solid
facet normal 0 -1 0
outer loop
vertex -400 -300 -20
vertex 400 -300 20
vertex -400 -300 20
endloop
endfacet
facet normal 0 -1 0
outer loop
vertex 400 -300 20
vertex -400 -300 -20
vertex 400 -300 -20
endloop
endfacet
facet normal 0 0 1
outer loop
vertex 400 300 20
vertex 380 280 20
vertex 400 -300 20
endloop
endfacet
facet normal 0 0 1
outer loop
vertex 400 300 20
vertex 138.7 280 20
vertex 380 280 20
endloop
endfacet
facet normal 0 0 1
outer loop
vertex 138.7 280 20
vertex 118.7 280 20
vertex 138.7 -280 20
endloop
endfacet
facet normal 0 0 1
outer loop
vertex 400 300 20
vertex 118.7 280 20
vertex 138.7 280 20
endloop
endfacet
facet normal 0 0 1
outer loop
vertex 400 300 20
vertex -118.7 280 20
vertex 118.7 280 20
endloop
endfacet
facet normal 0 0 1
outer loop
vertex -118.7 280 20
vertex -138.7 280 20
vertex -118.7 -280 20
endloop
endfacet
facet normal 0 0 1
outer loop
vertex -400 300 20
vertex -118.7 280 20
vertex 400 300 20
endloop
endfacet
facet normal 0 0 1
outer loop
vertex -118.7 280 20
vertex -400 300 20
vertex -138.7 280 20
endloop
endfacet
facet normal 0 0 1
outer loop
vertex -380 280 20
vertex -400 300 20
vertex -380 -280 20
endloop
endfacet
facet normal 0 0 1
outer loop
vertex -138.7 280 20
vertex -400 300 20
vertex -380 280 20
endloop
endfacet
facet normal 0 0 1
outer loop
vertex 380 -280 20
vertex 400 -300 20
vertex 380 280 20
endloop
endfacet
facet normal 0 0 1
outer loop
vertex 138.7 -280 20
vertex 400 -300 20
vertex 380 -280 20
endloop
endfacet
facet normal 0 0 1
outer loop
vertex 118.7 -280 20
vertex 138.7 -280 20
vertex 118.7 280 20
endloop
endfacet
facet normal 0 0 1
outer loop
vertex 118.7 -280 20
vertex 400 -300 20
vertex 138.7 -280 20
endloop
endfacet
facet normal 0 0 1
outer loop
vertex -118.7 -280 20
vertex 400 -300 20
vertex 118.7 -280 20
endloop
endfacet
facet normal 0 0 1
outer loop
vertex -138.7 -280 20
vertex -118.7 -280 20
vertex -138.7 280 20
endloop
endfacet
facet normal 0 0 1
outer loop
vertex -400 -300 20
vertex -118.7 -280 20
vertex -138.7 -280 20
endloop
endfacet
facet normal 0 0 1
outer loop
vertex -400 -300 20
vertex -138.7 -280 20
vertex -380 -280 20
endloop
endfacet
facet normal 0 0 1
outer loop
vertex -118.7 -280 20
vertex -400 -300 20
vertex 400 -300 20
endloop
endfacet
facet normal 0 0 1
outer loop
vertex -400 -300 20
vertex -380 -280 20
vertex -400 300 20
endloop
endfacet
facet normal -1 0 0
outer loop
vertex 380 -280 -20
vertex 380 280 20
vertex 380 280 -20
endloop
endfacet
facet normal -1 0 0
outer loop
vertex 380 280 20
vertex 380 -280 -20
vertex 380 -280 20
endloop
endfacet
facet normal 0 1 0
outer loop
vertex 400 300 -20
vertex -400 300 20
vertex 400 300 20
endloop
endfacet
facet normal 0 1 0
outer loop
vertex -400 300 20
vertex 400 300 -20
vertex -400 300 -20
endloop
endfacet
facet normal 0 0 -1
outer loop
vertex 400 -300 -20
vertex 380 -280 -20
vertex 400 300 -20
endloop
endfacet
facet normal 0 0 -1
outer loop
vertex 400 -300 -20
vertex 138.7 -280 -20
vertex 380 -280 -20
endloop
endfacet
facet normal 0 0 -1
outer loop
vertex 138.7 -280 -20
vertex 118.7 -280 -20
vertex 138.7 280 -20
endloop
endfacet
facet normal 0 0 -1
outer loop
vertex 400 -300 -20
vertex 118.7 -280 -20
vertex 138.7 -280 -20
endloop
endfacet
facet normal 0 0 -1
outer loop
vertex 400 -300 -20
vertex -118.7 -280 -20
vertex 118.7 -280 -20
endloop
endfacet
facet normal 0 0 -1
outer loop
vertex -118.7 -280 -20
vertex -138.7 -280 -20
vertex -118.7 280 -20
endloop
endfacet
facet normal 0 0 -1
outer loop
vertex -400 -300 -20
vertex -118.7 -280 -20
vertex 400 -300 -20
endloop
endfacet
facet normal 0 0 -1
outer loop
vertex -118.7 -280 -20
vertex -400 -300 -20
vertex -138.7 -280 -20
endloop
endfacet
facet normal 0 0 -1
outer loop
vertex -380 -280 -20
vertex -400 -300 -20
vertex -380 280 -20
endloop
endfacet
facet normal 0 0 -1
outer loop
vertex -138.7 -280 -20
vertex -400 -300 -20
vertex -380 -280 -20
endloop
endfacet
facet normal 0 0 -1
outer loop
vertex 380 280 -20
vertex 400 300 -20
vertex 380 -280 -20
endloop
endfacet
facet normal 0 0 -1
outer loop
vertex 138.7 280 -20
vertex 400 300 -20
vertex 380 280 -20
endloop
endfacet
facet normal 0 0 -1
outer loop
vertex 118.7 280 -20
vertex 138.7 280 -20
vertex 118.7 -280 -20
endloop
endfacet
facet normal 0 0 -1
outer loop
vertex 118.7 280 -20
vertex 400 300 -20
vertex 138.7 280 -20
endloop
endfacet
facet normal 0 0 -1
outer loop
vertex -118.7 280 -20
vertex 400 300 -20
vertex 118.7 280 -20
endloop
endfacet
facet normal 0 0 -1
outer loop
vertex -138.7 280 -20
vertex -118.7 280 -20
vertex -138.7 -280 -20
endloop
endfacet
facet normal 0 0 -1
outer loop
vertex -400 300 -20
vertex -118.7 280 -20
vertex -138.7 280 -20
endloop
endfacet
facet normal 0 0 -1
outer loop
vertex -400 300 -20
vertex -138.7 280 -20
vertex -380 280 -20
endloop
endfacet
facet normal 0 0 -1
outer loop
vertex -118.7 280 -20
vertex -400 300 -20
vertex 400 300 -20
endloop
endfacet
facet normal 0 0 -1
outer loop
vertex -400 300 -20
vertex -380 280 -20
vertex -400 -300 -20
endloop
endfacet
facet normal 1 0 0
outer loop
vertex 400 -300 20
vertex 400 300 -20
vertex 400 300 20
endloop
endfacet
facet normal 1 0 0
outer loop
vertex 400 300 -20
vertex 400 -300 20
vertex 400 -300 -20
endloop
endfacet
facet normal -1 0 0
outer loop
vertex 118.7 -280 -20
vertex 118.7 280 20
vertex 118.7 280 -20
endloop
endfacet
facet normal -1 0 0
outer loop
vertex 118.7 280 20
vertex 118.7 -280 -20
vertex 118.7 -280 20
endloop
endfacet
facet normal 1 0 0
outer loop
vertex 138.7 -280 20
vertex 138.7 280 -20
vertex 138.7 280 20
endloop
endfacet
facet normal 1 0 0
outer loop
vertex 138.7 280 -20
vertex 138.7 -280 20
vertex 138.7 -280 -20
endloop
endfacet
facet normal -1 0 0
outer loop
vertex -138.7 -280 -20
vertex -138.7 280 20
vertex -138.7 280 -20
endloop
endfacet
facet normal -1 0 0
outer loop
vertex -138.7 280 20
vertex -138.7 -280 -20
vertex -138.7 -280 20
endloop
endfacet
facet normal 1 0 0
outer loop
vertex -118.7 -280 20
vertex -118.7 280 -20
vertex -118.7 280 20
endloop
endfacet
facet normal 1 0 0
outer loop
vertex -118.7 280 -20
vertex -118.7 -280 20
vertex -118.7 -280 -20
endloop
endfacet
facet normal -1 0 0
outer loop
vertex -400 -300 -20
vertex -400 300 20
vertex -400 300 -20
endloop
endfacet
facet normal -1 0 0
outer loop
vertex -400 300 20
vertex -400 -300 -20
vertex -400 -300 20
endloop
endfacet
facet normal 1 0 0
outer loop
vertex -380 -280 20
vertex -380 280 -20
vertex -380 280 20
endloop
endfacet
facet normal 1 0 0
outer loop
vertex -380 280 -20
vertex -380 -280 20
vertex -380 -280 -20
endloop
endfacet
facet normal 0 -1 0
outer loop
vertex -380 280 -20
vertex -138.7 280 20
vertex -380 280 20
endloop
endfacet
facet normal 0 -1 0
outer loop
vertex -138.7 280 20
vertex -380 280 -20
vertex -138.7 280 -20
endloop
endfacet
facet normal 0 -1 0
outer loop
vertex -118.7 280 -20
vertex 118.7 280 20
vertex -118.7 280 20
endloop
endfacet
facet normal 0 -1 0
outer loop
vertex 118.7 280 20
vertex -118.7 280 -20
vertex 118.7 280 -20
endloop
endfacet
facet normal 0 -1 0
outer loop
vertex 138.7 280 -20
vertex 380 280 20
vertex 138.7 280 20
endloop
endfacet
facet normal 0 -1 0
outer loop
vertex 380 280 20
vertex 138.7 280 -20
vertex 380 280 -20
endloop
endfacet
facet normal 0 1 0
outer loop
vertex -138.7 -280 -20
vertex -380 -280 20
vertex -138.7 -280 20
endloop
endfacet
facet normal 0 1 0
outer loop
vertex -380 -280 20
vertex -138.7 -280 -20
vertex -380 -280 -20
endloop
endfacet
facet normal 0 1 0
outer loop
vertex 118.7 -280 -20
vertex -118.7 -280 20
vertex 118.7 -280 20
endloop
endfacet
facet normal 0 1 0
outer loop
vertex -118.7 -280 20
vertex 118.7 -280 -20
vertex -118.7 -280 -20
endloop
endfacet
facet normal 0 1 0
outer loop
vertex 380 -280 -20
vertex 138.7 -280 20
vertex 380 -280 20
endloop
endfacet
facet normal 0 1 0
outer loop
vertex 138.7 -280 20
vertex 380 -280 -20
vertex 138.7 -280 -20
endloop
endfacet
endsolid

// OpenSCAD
module Chassis01(lod=0, length=800, width=600, tube_profile=[40,20]){
    
    if (lod==0){
        for (l=[1, 0.33, -0.33, -1]) {
            translate(l*[(length/2-tube_profile[1]/2),0,0])
            rotate([0, 90, 90])
            linear_extrude(height=width, center=true)
            square(tube_profile, center=true);
        }
        
        for (w=[1, -1]) {
            translate(w*[0,(width/2-tube_profile[1]/2),0])
            rotate([0, 90, 0])
            linear_extrude(height=length, center=true)
            square(tube_profile, center=true);
        }
    }
}

Chassis01();
